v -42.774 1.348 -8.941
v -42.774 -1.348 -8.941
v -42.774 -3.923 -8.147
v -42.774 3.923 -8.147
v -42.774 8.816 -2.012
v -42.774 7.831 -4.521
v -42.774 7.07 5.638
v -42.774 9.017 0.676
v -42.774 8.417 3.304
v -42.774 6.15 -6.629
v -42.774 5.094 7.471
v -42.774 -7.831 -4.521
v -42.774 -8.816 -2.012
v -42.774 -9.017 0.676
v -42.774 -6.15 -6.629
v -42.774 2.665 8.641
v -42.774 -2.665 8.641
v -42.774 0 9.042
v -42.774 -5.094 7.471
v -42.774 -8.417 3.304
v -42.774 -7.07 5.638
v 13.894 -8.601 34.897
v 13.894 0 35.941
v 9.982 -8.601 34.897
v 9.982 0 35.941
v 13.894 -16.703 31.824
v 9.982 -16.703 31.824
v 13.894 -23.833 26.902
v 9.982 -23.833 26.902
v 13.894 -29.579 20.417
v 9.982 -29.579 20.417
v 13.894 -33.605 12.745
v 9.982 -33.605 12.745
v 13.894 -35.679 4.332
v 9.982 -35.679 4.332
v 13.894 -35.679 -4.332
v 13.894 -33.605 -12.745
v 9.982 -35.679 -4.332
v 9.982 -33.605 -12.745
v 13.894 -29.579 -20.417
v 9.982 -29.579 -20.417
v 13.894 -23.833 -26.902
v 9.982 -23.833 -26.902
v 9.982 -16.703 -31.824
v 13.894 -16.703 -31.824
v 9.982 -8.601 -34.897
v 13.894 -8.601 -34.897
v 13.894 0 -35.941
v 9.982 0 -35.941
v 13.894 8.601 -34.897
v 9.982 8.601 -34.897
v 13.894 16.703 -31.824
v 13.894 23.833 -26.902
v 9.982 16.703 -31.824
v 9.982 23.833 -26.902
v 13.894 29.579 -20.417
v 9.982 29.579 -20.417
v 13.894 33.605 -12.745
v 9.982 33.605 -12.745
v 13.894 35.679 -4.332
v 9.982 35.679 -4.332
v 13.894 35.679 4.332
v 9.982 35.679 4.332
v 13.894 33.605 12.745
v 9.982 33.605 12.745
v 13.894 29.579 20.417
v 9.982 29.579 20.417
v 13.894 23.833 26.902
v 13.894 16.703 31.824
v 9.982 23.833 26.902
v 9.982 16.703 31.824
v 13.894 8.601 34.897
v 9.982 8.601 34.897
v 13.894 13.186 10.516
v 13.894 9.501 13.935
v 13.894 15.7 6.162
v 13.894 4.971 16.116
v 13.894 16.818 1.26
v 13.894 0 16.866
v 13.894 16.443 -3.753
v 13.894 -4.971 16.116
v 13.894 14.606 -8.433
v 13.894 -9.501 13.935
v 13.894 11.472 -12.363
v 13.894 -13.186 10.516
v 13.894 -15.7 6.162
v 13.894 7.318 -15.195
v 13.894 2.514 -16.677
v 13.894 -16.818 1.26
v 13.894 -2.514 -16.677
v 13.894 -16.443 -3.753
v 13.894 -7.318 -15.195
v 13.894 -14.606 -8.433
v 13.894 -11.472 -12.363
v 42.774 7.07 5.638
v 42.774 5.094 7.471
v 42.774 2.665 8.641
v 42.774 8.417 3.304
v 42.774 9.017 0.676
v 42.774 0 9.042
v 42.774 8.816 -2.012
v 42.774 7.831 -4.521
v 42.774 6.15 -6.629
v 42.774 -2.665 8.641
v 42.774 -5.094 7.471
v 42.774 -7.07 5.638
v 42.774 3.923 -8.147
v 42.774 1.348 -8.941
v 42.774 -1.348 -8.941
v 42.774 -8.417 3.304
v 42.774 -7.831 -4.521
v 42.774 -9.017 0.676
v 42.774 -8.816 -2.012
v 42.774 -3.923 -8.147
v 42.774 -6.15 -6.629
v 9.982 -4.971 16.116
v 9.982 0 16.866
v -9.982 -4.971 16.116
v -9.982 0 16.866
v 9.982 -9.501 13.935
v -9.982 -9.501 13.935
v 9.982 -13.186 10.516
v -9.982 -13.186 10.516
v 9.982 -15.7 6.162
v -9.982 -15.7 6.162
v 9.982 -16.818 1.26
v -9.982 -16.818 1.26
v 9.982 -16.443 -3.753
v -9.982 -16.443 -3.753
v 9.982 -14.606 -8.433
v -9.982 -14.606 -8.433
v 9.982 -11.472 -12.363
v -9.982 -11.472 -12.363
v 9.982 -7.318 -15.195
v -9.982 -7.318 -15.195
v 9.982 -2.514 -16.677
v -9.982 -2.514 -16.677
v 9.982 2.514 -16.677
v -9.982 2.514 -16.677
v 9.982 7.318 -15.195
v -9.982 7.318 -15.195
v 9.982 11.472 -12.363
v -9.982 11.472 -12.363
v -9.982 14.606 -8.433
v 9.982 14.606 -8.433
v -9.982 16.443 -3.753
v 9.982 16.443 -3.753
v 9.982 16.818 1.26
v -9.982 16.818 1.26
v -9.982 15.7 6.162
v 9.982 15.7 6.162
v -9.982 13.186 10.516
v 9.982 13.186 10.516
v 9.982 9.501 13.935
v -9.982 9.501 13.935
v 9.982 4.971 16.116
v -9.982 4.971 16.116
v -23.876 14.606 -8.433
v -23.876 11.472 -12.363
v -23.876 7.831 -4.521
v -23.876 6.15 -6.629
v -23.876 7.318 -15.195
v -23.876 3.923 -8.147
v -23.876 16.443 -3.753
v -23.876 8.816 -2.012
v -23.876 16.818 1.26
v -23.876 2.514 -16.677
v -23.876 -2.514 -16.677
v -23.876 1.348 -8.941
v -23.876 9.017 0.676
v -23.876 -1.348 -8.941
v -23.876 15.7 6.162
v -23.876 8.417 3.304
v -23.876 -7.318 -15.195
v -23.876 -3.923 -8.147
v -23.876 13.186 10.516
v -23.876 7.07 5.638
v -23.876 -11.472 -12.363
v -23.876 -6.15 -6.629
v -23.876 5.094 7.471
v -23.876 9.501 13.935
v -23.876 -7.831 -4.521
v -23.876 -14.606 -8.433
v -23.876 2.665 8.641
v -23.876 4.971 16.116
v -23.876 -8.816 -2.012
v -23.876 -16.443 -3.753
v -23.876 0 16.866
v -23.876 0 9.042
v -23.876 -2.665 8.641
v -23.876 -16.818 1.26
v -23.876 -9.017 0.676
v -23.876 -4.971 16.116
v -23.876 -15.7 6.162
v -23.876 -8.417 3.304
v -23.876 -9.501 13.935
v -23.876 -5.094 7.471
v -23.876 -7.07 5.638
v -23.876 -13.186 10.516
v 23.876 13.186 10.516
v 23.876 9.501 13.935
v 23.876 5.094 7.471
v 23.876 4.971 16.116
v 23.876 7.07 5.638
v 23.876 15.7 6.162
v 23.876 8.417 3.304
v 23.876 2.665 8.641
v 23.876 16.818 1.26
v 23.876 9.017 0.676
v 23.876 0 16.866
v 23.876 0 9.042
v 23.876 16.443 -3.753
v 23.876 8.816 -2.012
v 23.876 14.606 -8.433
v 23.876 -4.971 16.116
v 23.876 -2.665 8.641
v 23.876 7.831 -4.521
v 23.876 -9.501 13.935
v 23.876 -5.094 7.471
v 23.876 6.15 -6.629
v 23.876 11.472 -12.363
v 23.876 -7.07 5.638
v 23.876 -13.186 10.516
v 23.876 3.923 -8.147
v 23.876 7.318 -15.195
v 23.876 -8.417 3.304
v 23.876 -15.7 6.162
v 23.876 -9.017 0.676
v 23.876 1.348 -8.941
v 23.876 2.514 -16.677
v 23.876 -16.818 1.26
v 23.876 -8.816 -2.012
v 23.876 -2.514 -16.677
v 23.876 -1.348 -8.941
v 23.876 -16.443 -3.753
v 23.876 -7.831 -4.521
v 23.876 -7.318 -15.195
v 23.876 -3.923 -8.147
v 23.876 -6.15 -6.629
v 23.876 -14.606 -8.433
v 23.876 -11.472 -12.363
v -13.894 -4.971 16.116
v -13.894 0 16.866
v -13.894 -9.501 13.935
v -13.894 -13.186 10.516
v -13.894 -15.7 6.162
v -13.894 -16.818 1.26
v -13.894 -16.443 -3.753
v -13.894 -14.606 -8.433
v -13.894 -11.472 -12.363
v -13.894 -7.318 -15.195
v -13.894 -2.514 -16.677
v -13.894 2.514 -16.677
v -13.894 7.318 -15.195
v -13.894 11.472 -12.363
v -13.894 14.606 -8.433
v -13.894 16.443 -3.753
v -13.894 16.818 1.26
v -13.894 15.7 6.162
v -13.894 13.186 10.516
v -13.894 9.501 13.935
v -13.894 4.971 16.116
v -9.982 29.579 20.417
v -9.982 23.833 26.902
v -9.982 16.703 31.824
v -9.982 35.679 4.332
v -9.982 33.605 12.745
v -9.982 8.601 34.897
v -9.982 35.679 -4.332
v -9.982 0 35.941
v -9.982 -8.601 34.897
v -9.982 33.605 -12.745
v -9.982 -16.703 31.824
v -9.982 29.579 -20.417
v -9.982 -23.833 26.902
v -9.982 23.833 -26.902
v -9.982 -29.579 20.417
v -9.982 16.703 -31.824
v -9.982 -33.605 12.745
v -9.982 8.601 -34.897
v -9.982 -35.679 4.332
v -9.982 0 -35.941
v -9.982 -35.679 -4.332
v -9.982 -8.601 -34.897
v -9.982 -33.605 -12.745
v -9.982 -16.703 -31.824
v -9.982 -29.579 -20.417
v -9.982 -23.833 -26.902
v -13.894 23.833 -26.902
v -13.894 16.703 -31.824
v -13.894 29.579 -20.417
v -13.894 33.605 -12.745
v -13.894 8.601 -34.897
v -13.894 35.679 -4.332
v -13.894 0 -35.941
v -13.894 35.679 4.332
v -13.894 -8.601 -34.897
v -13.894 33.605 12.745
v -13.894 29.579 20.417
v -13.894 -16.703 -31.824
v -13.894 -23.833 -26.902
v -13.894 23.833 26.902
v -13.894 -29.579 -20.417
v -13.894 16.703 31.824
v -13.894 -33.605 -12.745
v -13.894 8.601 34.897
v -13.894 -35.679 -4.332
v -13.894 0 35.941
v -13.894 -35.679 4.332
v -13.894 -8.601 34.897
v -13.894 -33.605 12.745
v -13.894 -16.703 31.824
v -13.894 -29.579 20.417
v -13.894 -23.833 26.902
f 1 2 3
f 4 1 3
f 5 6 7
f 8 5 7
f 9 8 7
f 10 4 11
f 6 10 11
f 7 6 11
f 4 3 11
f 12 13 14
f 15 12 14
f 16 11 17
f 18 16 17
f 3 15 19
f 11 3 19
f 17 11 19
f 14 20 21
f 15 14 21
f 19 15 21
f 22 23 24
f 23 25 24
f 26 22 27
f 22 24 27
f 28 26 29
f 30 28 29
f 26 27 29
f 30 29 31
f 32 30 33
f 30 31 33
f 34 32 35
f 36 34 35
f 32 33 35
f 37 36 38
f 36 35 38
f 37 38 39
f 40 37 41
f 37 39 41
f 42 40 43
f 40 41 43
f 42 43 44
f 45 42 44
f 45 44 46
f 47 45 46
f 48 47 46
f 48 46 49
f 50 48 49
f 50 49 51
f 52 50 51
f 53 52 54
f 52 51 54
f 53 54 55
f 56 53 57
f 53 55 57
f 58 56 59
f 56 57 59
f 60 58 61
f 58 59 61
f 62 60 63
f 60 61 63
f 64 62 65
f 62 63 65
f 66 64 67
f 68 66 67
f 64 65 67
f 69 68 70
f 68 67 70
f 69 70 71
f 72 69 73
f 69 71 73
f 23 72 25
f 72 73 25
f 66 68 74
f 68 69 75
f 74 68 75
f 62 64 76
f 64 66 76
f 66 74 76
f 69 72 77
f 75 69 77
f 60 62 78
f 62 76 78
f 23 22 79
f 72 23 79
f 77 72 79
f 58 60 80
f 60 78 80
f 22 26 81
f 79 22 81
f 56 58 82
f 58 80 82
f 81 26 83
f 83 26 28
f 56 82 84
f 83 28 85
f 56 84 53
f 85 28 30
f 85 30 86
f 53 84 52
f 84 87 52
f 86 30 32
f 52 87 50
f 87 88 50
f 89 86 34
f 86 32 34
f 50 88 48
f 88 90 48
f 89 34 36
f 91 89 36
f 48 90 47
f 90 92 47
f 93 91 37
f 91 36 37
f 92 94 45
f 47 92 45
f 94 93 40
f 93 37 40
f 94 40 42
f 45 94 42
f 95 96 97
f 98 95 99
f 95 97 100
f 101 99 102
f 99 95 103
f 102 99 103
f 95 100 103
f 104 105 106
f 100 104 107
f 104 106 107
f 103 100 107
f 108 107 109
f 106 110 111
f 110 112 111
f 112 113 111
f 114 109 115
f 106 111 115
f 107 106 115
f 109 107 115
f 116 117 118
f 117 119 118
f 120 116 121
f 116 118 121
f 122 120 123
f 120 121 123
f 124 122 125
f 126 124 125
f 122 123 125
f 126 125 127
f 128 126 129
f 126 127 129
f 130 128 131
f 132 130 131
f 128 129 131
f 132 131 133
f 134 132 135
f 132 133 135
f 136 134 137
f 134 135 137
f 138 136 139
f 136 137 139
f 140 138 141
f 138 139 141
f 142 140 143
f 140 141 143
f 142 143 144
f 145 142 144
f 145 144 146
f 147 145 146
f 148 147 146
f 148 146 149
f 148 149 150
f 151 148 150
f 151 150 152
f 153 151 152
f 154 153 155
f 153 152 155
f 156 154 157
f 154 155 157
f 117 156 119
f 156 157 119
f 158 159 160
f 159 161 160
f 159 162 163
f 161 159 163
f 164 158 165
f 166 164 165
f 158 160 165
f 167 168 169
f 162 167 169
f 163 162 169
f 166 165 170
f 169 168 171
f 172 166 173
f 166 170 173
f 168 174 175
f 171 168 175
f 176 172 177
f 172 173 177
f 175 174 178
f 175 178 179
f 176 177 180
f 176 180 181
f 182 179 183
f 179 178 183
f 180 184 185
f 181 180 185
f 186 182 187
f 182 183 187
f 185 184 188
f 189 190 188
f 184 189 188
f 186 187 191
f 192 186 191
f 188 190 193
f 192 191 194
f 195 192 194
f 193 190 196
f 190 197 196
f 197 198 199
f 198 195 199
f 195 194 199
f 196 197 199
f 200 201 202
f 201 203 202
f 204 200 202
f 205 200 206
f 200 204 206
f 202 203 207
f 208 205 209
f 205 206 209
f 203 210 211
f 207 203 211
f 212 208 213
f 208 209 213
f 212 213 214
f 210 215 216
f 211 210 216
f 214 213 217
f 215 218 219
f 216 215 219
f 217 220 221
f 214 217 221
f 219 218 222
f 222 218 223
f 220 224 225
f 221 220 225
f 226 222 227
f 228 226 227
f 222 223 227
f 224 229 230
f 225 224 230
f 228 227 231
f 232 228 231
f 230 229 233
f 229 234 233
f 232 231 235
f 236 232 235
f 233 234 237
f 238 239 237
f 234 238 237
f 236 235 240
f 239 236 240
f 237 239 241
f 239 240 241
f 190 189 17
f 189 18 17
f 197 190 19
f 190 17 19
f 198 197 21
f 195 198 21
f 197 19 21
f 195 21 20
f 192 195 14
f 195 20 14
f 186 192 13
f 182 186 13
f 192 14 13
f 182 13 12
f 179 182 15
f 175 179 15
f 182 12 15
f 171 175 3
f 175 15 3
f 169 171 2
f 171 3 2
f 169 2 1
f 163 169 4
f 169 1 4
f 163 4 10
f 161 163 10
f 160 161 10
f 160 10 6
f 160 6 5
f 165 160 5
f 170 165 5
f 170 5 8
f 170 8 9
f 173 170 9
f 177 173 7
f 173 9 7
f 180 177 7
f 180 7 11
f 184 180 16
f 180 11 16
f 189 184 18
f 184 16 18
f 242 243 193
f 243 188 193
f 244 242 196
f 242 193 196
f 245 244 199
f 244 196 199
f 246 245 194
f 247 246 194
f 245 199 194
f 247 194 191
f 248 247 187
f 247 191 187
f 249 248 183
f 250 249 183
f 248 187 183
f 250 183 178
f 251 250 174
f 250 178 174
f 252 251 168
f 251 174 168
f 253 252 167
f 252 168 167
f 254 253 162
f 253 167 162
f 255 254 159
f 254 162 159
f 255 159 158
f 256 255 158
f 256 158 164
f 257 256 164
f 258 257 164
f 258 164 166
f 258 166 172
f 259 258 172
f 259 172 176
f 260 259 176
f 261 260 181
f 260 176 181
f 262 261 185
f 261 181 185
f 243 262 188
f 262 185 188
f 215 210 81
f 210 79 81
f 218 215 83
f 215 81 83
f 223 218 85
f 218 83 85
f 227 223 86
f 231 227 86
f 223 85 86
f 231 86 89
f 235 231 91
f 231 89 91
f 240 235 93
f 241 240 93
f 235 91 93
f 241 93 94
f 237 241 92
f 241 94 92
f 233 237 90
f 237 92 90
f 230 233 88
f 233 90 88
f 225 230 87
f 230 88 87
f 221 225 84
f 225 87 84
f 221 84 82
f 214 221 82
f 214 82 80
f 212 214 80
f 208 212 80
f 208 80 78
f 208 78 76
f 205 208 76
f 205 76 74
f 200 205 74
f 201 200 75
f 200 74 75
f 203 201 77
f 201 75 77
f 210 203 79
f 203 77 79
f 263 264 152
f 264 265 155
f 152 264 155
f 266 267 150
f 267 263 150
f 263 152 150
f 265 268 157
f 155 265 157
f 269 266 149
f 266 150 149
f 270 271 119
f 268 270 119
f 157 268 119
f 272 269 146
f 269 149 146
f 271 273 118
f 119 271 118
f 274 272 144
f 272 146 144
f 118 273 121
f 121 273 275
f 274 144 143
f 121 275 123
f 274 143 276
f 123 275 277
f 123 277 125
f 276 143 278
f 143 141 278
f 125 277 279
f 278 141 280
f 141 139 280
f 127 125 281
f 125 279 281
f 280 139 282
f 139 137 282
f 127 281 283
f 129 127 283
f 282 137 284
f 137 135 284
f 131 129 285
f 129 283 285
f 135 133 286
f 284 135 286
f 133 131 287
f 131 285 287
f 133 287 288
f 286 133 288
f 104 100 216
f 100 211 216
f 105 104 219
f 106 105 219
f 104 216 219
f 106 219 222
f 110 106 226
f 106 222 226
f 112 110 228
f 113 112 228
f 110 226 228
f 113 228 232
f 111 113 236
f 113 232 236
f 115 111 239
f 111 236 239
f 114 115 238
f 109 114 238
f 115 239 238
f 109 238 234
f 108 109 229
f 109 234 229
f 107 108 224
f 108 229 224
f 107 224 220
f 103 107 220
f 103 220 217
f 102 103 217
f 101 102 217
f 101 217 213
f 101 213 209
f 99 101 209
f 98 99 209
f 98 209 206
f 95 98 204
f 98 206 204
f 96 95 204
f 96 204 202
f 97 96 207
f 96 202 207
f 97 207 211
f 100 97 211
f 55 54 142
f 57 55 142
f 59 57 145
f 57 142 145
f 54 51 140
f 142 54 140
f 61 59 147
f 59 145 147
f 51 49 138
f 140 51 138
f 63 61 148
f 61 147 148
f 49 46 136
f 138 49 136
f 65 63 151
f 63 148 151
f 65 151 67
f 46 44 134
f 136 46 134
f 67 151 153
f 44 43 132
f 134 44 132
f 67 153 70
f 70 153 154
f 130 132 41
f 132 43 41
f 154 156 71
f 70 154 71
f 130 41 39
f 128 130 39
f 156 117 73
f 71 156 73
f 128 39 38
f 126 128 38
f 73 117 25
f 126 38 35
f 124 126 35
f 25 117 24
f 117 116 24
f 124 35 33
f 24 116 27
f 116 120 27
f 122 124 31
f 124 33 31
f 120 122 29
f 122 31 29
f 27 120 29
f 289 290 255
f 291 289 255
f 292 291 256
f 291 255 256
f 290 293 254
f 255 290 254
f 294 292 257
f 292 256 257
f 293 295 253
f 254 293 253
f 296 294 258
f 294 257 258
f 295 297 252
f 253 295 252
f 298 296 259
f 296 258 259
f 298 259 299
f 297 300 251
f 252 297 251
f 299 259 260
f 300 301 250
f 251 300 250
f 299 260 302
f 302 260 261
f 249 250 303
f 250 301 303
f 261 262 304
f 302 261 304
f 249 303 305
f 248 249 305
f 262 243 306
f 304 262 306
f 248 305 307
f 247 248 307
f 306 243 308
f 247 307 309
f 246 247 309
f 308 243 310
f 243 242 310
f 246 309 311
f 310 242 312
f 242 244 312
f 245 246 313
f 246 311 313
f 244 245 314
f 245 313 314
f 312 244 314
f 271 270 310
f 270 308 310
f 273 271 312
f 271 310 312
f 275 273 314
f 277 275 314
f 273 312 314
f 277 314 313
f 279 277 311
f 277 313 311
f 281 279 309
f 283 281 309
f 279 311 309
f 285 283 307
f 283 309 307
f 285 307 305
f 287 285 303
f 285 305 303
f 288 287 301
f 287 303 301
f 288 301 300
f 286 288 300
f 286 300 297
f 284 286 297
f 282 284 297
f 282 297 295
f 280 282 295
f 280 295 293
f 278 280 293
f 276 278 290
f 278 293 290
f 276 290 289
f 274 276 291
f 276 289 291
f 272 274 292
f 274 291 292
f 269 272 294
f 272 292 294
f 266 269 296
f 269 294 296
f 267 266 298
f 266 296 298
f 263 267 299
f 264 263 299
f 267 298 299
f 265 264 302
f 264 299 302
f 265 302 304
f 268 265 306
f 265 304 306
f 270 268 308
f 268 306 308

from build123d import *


with BuildPart() as f1:
    # F0 (on Front) → F1 (revolve)
    with BuildSketch(Plane.XZ):
        Polygon((-42.7736, 0), (0, 0), (0, 16.8656), (-9.9822, 16.8656), (-9.9822, 35.941), (-13.8938, 35.941), (-13.8938, 16.8656), (-23.876, 16.8656), (-23.876, 9.0424), (-42.7736, 9.0424), align=None)
        Polygon((0, 16.8656), (0, 0), (42.7736, 0), (42.7736, 9.0424), (23.876, 9.0424), (23.876, 16.8656), (13.8938, 16.8656), (13.8938, 35.941), (9.9822, 35.941), (9.9822, 16.8656), align=None)
    revolve(axis=Axis((-21.3868, 0, 0), (1, 0, 0)))


solid = f1.part
